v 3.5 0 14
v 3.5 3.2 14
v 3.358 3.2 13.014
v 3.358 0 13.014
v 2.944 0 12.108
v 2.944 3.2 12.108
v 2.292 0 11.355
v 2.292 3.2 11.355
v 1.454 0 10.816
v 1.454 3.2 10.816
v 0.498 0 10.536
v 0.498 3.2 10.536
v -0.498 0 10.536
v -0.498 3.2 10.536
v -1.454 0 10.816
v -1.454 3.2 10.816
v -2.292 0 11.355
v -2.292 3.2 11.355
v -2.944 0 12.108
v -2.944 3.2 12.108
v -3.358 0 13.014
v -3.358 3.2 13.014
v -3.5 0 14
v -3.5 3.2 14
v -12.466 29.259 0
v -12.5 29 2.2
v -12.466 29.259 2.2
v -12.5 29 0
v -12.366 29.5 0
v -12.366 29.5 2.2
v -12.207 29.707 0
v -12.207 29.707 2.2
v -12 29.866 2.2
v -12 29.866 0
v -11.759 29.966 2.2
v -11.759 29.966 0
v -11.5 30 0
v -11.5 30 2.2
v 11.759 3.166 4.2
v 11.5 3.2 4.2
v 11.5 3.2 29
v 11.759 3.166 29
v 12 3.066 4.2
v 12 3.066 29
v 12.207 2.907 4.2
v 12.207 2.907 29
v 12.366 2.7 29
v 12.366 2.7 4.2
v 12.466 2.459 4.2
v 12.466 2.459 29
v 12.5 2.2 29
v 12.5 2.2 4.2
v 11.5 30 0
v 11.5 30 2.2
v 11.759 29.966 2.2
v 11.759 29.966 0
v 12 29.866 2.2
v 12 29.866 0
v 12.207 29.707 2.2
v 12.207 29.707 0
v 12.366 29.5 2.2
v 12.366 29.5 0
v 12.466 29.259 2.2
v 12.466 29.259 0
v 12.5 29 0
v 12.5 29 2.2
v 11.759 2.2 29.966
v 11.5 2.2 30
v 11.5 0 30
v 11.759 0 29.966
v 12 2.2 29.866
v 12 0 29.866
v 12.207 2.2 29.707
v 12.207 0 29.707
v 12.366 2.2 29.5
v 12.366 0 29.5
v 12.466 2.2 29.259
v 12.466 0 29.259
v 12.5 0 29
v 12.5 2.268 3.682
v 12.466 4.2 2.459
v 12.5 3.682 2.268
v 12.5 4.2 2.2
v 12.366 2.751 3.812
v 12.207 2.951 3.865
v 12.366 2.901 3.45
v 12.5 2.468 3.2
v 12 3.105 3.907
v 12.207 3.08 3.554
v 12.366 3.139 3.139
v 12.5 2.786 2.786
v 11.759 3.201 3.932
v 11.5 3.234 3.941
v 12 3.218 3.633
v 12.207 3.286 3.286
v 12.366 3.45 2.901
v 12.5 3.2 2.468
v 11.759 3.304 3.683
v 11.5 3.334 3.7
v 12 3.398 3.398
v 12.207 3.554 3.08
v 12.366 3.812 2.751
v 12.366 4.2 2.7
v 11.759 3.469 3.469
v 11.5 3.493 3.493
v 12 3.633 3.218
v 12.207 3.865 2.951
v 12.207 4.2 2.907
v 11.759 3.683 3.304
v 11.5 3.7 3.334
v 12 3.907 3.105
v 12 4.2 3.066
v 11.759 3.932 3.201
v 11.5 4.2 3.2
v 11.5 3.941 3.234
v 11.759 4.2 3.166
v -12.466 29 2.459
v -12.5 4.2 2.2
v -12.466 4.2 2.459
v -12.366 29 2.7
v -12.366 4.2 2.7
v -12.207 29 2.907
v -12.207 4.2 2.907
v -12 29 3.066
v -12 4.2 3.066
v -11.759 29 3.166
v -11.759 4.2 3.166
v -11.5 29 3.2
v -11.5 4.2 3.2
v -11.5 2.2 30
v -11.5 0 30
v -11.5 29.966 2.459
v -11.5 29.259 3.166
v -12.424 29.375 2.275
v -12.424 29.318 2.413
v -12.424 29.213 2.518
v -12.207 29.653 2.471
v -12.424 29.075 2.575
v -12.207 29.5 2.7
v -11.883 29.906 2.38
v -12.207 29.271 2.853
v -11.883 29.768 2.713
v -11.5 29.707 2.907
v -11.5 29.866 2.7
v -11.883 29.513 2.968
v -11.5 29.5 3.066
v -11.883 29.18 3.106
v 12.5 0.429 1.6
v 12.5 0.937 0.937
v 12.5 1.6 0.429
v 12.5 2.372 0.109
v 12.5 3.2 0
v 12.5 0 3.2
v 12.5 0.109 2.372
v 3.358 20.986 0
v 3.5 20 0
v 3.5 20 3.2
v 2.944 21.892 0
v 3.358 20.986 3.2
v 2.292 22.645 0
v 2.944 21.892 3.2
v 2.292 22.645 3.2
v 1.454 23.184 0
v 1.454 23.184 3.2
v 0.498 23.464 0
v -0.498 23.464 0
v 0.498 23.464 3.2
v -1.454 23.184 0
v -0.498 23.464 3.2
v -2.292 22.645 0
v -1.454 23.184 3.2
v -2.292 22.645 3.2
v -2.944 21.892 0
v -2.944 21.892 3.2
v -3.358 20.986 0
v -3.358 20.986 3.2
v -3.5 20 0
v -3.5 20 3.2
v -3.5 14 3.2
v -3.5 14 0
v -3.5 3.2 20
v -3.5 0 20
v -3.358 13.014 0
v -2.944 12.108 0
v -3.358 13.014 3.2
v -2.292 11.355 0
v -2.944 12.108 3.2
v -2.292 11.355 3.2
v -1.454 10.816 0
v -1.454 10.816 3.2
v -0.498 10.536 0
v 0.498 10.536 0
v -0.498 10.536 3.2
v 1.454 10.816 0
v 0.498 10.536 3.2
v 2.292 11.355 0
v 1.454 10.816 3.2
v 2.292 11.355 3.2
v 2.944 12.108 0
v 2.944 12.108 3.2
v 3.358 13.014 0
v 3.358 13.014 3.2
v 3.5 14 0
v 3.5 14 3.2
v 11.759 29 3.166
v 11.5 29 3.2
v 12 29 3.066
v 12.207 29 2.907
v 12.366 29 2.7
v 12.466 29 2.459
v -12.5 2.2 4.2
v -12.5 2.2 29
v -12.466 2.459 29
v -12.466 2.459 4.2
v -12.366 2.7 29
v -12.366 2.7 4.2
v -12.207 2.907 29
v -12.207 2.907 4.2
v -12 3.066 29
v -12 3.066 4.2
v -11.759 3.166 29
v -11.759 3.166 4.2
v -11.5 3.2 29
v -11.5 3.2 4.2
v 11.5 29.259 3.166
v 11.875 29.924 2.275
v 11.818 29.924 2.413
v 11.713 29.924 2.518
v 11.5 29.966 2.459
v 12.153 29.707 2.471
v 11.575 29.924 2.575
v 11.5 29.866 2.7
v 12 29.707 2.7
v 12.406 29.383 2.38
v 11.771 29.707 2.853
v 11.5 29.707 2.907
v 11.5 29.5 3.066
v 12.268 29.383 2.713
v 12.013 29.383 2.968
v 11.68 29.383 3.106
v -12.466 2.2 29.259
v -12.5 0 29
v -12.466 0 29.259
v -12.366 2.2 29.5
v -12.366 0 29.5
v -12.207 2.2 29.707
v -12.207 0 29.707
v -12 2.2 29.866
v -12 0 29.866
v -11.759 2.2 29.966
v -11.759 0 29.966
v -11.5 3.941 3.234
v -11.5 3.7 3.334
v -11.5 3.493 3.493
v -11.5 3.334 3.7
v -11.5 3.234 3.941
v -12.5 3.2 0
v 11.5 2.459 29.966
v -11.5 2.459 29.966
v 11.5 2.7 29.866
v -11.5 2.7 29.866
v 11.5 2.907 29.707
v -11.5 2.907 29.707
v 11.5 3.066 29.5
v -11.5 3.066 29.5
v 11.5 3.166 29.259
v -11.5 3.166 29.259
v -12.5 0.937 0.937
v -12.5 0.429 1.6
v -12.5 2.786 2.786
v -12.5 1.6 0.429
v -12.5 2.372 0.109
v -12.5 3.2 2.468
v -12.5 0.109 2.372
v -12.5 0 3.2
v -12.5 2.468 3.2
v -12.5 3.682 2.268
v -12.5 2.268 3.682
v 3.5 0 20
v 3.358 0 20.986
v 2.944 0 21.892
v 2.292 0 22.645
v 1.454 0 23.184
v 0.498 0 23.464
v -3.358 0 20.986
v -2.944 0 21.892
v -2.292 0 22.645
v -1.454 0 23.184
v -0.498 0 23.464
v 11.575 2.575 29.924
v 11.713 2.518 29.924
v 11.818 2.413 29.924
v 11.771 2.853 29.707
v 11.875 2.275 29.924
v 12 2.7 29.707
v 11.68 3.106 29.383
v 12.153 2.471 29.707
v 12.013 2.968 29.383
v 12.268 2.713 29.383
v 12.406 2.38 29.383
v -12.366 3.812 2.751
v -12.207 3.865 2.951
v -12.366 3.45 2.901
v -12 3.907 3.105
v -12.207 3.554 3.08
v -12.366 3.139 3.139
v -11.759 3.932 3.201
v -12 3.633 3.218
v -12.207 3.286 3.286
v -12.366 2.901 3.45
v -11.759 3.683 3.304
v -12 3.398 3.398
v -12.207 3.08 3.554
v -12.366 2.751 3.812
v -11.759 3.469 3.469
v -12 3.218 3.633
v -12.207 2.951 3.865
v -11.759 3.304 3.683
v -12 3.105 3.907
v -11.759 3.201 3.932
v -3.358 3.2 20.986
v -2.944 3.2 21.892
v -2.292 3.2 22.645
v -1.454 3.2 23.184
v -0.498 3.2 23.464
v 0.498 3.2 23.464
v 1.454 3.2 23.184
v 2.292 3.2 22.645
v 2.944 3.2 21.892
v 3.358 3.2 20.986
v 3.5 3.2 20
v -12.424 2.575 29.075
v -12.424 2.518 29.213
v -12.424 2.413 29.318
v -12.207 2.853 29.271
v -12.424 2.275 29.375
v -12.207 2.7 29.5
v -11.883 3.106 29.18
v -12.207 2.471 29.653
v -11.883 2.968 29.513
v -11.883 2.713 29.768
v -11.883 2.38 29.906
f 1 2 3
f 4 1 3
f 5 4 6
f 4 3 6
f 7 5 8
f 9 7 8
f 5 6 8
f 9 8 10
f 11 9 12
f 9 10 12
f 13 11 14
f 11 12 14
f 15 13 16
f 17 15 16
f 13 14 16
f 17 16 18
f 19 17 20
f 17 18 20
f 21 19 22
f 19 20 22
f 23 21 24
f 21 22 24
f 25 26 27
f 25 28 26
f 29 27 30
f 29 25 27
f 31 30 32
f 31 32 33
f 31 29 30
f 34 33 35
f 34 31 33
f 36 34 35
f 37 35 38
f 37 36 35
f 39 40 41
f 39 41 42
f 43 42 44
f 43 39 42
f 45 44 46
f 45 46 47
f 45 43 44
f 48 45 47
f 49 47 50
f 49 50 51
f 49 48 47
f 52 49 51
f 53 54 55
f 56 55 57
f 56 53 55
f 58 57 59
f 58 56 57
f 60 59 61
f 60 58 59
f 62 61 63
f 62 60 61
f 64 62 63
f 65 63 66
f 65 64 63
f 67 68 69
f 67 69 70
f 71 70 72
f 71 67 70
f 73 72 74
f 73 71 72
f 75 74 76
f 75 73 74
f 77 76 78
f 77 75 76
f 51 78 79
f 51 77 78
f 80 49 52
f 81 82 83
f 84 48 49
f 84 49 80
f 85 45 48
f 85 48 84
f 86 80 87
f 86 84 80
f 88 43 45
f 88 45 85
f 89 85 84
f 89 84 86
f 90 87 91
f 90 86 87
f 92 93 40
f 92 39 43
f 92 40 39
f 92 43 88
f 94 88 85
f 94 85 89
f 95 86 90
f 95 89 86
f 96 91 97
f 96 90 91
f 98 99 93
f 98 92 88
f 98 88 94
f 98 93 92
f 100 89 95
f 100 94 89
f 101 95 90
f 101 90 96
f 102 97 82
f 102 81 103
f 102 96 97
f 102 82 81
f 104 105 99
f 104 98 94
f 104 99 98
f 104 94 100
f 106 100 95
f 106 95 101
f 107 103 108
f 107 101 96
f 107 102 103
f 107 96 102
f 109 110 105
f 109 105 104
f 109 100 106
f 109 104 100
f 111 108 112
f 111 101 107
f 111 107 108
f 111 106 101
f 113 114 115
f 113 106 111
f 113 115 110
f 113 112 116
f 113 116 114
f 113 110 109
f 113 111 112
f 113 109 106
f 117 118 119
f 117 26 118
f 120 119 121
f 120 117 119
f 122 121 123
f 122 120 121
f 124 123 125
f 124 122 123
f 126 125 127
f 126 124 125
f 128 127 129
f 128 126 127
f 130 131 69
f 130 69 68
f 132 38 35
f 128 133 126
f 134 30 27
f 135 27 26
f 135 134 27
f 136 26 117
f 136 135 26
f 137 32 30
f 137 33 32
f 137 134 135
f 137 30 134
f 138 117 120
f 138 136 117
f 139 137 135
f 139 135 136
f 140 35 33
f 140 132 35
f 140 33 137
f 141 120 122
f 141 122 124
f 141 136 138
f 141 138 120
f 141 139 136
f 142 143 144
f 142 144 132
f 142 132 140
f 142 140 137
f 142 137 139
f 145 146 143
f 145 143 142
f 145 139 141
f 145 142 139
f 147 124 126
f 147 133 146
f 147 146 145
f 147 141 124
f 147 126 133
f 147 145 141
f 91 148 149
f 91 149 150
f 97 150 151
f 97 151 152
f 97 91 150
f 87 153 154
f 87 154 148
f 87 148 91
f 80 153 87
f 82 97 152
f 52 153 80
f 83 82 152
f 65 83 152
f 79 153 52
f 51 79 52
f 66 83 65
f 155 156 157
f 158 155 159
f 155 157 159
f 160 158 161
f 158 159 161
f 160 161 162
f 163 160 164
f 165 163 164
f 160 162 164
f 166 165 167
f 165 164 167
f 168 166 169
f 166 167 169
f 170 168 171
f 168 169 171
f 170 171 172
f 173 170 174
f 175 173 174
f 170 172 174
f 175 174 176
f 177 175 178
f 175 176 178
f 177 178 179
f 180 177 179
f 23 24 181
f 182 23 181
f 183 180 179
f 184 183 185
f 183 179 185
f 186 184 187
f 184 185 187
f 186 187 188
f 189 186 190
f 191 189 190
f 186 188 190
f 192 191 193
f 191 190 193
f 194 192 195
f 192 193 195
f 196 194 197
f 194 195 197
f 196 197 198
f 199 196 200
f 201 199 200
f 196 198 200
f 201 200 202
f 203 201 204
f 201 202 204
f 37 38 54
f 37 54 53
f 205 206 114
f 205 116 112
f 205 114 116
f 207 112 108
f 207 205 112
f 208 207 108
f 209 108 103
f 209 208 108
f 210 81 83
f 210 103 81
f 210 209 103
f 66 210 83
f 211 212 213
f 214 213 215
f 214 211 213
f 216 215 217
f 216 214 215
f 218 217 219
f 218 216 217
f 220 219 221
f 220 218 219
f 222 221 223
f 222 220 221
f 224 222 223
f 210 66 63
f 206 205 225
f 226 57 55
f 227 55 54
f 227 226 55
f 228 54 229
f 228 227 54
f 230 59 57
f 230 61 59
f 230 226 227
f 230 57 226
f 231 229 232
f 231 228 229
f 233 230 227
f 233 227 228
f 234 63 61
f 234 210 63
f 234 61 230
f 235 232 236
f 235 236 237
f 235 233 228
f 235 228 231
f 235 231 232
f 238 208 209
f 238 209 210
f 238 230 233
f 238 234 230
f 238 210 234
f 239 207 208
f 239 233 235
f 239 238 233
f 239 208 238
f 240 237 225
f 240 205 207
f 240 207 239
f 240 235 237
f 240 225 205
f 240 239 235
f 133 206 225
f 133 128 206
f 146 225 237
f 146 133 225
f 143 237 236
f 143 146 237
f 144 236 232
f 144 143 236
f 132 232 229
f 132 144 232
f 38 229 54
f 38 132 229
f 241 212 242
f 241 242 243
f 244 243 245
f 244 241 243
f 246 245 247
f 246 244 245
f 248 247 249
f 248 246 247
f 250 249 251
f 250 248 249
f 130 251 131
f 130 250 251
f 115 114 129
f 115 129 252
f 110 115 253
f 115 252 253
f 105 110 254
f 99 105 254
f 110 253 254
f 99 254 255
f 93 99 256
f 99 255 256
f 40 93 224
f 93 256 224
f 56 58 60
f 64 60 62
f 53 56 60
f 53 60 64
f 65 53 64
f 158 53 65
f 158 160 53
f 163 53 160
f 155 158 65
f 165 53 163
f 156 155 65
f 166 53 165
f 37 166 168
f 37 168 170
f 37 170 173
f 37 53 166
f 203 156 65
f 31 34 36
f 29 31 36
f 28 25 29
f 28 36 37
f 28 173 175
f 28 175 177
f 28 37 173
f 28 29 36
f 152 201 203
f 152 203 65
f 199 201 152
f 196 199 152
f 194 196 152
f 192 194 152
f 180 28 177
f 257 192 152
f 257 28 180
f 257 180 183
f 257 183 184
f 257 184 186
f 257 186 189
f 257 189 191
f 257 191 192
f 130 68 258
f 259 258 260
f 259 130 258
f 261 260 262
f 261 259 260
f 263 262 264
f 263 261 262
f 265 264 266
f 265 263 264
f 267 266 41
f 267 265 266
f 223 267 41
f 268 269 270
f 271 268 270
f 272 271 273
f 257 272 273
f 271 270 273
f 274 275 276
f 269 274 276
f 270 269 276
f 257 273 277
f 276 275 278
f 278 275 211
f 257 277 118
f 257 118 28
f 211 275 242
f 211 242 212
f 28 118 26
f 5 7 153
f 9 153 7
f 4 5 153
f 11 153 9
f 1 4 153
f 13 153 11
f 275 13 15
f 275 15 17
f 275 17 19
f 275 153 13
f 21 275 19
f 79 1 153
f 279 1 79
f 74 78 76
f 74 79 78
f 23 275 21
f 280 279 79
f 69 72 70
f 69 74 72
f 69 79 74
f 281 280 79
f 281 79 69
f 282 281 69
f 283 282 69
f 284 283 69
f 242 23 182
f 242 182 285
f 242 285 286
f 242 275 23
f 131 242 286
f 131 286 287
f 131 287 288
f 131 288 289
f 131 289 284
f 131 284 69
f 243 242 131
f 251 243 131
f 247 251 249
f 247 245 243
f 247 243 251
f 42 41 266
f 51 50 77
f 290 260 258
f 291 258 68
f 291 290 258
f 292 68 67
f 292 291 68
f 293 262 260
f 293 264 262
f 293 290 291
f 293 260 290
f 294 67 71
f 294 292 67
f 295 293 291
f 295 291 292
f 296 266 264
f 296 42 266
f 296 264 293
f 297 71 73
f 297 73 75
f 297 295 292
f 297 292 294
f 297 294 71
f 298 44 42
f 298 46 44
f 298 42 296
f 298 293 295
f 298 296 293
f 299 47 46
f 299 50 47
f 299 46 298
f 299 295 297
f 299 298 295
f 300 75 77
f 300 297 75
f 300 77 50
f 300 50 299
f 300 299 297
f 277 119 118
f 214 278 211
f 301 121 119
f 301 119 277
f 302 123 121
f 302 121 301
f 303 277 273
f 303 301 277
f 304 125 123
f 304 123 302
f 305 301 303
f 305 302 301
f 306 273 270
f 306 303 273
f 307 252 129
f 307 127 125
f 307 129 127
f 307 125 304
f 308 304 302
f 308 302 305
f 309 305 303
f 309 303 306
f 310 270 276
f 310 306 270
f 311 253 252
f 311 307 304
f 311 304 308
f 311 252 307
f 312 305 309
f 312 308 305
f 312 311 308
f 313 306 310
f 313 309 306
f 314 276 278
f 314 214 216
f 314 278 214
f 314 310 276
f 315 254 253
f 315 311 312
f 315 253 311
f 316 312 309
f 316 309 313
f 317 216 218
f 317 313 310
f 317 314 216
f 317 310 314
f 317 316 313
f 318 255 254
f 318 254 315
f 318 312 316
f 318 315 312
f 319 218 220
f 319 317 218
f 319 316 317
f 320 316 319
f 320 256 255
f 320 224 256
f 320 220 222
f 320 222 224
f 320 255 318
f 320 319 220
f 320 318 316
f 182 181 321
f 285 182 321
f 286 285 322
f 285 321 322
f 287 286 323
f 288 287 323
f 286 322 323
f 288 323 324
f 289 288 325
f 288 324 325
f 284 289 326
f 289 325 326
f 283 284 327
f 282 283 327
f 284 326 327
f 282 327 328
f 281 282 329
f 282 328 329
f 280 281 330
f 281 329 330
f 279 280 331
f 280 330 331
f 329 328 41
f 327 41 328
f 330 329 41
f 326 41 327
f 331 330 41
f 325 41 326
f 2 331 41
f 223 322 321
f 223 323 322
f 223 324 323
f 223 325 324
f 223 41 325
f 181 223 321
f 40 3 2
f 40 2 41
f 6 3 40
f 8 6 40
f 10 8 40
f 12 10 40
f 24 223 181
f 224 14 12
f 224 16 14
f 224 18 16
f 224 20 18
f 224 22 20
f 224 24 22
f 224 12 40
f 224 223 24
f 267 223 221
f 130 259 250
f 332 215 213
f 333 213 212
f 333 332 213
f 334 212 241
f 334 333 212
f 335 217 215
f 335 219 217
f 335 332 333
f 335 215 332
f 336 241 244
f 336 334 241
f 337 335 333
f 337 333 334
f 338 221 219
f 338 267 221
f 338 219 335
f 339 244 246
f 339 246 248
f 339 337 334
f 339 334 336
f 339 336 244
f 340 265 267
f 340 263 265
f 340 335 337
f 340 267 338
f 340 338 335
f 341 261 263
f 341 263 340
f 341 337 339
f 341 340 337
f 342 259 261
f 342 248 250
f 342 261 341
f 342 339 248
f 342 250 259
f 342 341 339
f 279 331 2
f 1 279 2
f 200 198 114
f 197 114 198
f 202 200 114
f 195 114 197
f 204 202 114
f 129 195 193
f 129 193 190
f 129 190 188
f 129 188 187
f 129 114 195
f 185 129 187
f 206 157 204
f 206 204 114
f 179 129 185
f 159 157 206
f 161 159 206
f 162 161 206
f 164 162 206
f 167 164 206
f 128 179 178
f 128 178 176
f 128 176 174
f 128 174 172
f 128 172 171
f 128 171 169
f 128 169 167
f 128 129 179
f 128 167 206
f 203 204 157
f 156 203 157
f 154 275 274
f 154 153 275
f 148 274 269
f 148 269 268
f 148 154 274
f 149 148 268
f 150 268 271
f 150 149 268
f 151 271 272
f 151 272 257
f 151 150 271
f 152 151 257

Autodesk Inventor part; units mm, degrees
ref_plane "YZ Plane" through (0, 0, 0) normal (1, 0, 0) x (0, 1, 0)
ref_plane "XZ Plane" through (0, 0, 0) normal (0, 1, 0) x (-1, 0, 0)
sketch "스케치1" plane through (0, 0, 0) normal (1, 0, 0) x (0, 1, 0)
  line L0 (0, 10) -> (0, 30)
  line L1 (0, 30) -> (3.2, 30)
  line L2 (3.2, 30) -> (3.2, 3.2)
  line L3 (3.2, 3.2) -> (30, 3.2)
  line L4 (30, 3.2) -> (30, 0)
  line L5 (30, 0) -> (0, 0)
  line L6 (0, 0) -> (0, 10)
  dimension "d2" = 3.2
  dimension "d3" = 26.8
  dimension "d4" = 26.8
  dimension "d5" = 90
  dimension "d6" = 3.2
  dimension "d13" = 90
  dimension "d14" = 10
extrude "돌출1" add sketch "스케치1" along normal mid plane 25
sketch "스케치2" plane through (-12.5, 3.2, 30) normal (0, 1, 0) x (1, 0, 0)
  line L0 (12.5, 10) -> (12.5, 16) construction
  line L1 (16, 10) -> (16, 16)
  line L2 (9, 16) -> (9, 10)
  arc A0 (9, 10) -> (16, 10) centre (12.5, 10) ccw
  arc A1 (16, 16) -> (9, 16) centre (12.5, 16) ccw
  line L3 (0, 0) -> (25, 0) projected
  line L4 (0, 0) -> (0, 26.8) projected
  point P0 (12.5, 30)
  point P1 (12.5, 13)
  point P2 (0, 13.4)
  dimension "d10" = 6
  dimension "d11" = 7
  dimension "d12" = 10
  dimension "d15" = 12.5
extrude "돌출2" cut sketch "스케치2" against normal through all
ref_plane "작업 평면1" through (-12.5, 3.2, 3.2) normal (0, 0.7071, -0.7071) x (-1, 0, 0)
mirror "미러1" about plane through (-12.5, 3.2, 3.2) normal (0, 0.7071, -0.7071) of "돌출2"
fillet "모깎기2" radius 1 11 edges at (12.5, 16.6, 3.2) (0, 30, 3.2) (-12.5, 16.6, 3.2) (12.5, 3.2, 16.6) (0, 3.2, 30) (-12.5, 3.2, 16.6) (0, 3.2, 3.2) (12.5, 30, 1.6) (-12.5, 30, 1.6) (-12.5, 1.6, 30) (12.5, 1.6, 30)
fillet "모깎기3" radius 3.2 1 edges at (0, 0, 0)
properties part number "안쪽브라켓"
